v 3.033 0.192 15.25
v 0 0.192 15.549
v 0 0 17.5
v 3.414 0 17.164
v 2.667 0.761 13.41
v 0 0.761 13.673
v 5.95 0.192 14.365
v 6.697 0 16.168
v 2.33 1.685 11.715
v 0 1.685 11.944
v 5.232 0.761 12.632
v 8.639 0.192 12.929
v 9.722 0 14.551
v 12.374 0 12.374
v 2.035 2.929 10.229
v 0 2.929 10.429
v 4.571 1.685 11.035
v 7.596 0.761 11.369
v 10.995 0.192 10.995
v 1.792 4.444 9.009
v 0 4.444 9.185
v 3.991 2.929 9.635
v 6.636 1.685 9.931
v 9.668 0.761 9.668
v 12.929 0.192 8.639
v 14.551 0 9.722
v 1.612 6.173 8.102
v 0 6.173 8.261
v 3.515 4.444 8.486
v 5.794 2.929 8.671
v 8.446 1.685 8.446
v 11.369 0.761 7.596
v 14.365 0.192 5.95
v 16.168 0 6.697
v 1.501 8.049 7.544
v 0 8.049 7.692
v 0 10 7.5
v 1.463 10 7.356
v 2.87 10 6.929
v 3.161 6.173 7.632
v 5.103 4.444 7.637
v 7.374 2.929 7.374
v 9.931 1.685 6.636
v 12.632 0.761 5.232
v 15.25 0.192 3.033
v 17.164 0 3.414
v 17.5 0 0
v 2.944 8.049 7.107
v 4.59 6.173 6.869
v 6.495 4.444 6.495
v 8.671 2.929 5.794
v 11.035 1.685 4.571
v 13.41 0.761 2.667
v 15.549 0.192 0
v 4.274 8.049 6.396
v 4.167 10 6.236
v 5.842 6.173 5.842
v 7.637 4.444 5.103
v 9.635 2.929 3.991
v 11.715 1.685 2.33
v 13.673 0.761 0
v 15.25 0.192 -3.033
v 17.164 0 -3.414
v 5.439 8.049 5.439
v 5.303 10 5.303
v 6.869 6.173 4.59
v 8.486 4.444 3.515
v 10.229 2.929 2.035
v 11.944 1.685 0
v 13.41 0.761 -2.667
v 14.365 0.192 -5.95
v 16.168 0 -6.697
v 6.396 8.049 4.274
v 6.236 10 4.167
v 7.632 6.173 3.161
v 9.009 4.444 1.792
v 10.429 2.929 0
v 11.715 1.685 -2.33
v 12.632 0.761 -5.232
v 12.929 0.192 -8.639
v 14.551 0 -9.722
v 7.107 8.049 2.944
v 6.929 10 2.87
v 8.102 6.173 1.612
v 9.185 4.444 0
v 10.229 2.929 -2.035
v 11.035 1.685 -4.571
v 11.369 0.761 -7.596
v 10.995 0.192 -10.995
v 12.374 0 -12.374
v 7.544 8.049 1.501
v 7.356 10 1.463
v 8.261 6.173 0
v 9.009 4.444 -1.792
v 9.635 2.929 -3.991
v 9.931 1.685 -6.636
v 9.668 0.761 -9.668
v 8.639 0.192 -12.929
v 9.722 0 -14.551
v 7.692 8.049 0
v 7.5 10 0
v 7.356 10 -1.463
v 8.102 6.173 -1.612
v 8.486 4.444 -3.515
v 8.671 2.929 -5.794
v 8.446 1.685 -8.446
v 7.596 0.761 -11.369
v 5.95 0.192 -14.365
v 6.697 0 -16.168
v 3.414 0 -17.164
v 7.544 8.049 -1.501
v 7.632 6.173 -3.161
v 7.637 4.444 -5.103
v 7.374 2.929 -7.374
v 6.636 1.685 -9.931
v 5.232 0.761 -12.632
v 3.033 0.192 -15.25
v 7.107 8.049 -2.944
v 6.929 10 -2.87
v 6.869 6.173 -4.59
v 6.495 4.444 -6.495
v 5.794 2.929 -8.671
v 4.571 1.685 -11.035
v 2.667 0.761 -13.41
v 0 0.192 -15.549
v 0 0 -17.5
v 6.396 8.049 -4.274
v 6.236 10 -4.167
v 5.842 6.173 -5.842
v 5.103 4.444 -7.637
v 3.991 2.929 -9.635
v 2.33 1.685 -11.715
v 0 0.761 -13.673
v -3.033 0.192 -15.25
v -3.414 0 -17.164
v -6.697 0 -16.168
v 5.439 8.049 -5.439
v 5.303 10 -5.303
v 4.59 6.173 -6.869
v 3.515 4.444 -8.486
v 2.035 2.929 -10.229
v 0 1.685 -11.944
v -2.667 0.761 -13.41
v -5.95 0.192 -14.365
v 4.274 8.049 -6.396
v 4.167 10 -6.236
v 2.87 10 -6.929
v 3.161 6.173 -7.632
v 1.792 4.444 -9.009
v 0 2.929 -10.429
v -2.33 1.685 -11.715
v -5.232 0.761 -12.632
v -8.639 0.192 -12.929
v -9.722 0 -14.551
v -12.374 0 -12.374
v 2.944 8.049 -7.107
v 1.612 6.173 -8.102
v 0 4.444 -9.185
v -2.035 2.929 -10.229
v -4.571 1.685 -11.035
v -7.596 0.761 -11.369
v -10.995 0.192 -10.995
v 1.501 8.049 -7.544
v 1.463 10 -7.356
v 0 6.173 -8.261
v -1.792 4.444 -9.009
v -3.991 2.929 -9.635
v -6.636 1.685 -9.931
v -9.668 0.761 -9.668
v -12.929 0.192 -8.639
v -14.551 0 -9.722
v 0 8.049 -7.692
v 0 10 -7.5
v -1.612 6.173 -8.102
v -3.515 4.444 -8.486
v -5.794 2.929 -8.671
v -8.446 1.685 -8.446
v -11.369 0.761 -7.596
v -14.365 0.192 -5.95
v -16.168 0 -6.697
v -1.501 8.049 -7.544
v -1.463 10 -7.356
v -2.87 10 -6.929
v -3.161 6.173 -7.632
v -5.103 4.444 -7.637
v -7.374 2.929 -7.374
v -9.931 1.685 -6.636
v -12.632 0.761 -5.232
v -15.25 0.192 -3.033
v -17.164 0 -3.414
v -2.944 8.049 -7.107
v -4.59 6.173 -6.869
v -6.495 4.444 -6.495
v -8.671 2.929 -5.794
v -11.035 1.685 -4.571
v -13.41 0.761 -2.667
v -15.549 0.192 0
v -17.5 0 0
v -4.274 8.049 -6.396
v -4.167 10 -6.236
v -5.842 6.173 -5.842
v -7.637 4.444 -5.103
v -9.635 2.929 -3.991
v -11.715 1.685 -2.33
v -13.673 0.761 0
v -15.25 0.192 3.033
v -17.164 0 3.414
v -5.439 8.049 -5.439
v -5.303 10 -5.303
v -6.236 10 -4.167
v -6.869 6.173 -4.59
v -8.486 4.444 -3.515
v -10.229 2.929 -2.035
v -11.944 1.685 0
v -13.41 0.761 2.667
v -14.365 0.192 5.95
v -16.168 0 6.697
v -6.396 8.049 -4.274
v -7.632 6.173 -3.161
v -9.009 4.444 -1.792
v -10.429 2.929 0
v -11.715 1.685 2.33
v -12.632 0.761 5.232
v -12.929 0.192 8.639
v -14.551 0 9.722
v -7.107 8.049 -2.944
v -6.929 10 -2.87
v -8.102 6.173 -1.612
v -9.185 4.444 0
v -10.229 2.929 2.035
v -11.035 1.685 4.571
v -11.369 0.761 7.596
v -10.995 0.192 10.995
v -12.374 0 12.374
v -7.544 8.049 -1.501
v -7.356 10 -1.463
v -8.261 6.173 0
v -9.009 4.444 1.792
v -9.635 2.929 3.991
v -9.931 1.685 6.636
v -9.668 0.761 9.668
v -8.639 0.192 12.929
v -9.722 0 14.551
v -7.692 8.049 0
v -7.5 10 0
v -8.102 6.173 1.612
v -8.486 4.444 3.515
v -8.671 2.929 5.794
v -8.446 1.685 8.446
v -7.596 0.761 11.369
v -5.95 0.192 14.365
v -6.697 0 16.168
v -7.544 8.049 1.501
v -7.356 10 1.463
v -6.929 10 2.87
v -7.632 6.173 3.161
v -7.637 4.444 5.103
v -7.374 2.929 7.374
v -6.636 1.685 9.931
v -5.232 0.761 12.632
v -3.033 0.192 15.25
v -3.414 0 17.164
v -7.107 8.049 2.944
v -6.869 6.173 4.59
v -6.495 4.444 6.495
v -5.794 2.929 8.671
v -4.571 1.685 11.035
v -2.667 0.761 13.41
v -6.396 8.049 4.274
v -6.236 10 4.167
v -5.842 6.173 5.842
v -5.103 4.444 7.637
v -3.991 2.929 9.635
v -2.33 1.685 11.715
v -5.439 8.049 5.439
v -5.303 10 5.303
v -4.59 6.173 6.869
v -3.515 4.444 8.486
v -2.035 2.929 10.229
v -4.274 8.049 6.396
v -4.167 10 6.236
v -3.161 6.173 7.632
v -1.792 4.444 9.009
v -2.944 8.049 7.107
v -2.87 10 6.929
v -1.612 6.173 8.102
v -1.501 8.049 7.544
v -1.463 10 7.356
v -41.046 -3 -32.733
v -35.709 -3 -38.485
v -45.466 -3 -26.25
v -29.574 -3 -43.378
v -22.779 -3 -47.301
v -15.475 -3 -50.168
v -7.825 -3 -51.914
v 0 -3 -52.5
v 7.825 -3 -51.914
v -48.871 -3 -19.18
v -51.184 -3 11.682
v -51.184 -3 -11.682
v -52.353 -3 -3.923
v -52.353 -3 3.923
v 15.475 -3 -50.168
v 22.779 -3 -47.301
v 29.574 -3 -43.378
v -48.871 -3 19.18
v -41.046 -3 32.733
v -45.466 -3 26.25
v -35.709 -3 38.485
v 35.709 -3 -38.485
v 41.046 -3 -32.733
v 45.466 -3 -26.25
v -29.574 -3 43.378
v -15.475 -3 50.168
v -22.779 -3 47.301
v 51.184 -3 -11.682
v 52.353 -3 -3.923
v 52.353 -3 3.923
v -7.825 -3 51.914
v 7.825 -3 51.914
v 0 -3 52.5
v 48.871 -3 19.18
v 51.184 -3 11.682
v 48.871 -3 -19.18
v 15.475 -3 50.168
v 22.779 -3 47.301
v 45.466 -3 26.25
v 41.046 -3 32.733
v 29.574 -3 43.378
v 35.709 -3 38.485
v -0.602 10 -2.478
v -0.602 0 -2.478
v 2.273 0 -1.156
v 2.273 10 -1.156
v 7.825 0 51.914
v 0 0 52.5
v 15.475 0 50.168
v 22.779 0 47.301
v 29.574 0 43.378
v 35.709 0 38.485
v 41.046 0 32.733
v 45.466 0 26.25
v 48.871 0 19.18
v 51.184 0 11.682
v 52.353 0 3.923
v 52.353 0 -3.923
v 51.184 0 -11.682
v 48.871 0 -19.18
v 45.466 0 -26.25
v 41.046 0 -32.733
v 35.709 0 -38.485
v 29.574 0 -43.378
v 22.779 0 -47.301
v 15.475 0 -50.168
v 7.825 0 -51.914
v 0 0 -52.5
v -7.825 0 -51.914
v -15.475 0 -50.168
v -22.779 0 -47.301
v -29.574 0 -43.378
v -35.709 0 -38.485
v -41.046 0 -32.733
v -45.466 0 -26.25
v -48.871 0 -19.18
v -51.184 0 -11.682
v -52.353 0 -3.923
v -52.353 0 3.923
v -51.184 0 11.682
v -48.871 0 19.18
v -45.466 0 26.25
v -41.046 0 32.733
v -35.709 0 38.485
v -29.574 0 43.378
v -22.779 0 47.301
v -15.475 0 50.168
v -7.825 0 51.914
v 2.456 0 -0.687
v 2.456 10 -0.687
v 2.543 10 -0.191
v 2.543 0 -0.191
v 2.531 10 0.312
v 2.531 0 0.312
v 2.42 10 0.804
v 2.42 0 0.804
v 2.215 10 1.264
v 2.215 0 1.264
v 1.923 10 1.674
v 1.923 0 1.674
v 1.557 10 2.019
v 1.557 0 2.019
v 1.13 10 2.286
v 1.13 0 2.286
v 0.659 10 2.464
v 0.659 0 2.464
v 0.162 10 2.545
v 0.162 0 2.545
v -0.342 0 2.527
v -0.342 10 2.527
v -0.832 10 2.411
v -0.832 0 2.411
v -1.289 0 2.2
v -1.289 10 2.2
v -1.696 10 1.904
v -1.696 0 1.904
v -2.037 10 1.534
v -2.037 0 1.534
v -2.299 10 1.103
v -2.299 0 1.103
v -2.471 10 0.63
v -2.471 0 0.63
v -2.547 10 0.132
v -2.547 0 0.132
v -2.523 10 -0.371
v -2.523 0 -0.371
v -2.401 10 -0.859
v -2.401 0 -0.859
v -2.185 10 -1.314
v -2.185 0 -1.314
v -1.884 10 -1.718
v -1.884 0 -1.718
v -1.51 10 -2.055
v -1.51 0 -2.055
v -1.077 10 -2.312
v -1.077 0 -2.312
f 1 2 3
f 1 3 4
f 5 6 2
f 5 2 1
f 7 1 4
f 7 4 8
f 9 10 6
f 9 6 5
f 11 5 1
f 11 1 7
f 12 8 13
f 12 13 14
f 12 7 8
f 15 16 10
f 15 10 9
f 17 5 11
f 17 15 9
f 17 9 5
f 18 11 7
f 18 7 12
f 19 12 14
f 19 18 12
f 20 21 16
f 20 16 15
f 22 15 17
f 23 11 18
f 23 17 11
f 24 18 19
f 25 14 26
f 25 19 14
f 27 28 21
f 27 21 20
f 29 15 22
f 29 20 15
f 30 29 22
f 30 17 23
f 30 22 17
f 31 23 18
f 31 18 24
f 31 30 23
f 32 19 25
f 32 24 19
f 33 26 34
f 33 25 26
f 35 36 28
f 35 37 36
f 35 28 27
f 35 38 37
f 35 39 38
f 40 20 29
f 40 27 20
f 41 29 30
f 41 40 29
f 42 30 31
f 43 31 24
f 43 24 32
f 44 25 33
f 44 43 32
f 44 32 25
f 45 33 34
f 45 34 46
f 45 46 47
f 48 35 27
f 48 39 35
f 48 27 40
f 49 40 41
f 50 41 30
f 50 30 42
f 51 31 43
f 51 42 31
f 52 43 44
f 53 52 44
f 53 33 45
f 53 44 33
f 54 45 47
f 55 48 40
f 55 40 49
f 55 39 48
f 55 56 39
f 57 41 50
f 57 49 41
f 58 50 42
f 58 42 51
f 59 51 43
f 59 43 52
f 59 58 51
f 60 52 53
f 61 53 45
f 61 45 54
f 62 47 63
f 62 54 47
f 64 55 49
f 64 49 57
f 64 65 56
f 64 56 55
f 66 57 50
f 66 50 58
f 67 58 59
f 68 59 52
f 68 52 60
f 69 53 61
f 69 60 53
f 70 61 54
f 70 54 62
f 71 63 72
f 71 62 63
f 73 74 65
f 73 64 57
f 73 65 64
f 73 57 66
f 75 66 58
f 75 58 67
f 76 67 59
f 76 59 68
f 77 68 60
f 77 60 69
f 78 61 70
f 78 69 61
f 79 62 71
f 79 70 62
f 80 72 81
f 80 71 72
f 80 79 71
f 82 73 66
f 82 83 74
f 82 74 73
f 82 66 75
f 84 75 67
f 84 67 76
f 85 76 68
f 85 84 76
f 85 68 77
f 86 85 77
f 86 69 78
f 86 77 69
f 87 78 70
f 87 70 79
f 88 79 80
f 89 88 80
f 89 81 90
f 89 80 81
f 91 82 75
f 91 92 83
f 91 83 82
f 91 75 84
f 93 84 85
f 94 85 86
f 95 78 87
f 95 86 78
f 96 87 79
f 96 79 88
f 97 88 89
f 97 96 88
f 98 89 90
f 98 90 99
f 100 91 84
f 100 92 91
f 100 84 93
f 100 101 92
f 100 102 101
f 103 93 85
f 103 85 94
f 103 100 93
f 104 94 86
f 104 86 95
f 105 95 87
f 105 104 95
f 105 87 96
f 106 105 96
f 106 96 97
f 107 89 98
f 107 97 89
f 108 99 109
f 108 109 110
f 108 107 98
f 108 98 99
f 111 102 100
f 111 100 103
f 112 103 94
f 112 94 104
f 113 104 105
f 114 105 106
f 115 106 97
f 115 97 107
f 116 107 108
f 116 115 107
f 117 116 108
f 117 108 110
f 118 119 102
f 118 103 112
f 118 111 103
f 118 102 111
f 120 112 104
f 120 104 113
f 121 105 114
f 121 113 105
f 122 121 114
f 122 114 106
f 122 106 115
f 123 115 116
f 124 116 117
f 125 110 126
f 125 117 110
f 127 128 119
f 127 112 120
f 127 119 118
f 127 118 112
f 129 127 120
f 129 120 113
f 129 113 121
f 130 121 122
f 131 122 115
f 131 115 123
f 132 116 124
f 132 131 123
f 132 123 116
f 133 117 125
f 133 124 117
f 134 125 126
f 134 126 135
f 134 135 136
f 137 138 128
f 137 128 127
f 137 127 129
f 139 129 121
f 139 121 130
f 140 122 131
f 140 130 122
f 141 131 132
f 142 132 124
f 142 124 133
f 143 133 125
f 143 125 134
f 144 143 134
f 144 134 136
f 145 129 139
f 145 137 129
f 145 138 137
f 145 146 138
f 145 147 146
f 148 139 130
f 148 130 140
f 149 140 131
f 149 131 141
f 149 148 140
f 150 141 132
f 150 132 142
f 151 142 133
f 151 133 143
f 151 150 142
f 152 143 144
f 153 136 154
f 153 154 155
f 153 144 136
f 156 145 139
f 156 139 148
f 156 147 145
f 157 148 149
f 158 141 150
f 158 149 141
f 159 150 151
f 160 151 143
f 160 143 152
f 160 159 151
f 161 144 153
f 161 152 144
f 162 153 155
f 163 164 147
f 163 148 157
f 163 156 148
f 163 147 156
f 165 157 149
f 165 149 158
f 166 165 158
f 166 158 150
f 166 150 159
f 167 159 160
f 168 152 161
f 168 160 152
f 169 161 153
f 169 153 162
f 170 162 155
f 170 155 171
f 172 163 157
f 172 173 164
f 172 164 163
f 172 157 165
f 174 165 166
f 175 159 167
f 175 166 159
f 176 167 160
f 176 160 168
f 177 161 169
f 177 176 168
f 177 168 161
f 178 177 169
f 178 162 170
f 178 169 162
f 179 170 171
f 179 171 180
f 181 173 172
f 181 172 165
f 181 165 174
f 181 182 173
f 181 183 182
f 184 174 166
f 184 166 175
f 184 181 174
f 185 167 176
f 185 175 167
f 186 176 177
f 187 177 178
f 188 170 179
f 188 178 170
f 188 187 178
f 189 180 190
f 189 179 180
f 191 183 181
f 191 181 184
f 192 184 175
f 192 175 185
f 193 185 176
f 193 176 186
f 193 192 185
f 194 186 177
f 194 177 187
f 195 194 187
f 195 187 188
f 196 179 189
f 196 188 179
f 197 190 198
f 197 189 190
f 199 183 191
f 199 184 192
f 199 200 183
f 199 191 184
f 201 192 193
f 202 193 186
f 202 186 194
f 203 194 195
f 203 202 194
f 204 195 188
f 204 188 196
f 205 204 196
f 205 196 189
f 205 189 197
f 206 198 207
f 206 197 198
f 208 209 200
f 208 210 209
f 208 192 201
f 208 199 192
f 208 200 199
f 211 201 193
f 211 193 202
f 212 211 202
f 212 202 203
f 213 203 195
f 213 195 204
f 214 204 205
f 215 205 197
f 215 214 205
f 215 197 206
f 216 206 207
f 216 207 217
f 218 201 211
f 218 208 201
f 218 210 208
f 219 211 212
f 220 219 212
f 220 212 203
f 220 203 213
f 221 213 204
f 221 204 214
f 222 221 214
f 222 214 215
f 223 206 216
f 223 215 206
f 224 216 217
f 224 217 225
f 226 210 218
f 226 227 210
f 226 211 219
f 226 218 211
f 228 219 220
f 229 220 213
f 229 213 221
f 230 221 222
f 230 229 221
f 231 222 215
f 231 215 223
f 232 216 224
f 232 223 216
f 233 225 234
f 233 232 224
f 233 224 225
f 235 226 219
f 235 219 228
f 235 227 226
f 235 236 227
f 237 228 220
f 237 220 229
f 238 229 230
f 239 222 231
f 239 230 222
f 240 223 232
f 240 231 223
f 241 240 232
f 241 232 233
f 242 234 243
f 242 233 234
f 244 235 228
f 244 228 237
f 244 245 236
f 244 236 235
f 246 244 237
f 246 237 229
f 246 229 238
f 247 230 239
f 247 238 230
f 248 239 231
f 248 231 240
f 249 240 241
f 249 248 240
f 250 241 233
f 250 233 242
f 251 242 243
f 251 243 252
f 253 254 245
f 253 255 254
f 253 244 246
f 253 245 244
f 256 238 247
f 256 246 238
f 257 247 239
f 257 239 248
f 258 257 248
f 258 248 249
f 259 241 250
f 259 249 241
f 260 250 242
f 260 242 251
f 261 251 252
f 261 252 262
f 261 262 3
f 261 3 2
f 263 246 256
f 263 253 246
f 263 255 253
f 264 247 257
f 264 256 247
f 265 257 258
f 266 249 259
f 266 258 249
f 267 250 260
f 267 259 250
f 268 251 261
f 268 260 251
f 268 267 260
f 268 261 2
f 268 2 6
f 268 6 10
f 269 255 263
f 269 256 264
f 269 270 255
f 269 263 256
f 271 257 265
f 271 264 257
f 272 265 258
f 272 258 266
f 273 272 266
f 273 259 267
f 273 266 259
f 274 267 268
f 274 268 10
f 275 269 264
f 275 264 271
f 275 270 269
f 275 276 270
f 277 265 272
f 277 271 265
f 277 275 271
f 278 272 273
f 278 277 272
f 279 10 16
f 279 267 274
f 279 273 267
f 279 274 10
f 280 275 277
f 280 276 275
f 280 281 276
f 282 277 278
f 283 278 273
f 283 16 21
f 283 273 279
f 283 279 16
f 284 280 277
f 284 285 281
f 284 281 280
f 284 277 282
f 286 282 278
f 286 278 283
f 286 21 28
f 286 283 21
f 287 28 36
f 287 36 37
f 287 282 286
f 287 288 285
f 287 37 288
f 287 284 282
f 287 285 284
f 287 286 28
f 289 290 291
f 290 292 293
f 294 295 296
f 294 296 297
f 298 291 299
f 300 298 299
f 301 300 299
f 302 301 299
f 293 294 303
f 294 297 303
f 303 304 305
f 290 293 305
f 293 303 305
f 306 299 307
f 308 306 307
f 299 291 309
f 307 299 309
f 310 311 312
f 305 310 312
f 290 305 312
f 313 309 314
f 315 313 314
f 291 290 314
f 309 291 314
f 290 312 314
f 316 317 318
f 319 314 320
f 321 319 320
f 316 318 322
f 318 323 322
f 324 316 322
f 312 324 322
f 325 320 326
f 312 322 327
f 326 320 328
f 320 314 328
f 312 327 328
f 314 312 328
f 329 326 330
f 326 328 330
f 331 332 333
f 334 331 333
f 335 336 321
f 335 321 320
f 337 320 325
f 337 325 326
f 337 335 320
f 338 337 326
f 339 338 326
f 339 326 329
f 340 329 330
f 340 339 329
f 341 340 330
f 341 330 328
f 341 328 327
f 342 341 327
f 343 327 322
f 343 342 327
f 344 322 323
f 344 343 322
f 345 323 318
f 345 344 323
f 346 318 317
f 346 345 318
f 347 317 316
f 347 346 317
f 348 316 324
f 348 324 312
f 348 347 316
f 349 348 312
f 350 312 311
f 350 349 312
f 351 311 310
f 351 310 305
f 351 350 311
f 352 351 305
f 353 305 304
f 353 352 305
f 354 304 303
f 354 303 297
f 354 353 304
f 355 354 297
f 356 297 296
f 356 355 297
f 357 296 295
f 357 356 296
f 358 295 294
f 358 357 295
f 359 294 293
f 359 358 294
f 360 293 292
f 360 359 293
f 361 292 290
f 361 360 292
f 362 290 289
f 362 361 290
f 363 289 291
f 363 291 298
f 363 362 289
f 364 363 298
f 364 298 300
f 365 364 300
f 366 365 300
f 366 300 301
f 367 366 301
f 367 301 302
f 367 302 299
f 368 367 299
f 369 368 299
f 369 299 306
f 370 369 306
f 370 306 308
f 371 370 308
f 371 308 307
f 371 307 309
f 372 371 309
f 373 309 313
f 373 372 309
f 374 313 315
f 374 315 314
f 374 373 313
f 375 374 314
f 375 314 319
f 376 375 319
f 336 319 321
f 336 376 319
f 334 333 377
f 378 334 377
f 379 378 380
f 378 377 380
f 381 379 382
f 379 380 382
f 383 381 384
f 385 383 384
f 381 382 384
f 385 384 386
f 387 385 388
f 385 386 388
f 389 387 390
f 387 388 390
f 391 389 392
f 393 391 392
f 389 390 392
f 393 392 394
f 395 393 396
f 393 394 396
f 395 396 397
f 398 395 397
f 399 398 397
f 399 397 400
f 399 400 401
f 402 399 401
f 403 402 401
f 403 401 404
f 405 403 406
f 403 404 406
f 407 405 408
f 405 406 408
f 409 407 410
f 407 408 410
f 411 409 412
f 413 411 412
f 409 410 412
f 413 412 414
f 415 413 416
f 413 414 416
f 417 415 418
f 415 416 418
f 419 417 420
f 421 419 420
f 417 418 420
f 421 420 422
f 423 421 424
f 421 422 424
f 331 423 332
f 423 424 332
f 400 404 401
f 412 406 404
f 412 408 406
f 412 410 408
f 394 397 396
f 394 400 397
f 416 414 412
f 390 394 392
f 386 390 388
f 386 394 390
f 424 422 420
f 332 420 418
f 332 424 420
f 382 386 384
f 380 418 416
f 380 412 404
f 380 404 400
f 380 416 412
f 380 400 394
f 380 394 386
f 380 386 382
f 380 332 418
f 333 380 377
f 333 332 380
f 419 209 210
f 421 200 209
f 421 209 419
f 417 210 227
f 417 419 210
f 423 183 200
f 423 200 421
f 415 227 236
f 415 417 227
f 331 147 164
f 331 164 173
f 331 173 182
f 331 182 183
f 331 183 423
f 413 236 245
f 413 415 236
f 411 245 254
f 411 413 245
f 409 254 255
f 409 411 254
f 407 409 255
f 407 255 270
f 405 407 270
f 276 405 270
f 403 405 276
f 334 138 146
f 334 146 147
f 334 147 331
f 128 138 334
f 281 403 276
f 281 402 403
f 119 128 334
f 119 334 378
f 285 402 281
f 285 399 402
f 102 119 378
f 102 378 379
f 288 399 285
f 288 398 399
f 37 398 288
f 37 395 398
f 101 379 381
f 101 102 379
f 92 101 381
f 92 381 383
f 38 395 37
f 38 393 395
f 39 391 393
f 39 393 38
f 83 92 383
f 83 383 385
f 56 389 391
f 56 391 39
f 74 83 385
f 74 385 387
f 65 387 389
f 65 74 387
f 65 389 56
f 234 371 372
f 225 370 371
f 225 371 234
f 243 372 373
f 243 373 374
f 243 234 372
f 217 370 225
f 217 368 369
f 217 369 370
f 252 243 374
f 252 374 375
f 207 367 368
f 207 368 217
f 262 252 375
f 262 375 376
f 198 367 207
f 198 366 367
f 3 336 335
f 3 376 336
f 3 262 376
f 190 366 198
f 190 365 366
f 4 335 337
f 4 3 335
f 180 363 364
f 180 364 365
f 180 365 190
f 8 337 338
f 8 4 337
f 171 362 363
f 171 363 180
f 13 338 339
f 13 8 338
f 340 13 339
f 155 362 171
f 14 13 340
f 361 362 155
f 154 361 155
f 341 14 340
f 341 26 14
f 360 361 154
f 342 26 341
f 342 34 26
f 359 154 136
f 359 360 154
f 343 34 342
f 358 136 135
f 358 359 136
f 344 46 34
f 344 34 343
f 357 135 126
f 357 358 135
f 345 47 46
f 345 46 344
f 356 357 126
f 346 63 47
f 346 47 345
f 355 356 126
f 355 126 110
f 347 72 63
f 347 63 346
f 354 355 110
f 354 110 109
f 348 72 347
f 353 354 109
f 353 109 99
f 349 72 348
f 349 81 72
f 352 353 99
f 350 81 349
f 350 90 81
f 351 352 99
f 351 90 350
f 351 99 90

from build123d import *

# Parameters (mm, degrees)
SKIZZE1_R                       = 52.5
SKIZZE1_R_2                     = 7.5
SKIZZE1_R_3                     = 2.55
AUFSATZ_LINEAR_AUSTRAGEN1_DEPTH = 3
SKIZZE1_3_R                     = 7.5
AUFSATZ_LINEAR_AUSTRAGEN2_DEPTH = 10
VERRUNDUNG1_R                   = 10


with BuildPart() as part:
    # Skizze1 → Aufsatz-Linear austragen1 (new body)
    # profile 1 of 6: a face of its own
    with BuildSketch(Plane(origin=(0, 0, 0), x_dir=(1, 0, 0), z_dir=(0, 1, 0))):
        with Locations(Location((0, 0, 0), (0, 0, 270))):
            Circle(SKIZZE1_R)
        Circle(SKIZZE1_R_2, mode=Mode.SUBTRACT)
    # profile 2 of 6: a face of its own
    with BuildSketch(Plane(origin=(0, 0, 0), x_dir=(1, 0, 0), z_dir=(0, 1, 0))):
        Circle(SKIZZE1_R_2)
        Circle(SKIZZE1_R_3, mode=Mode.SUBTRACT)
    # profile 3 of 6: a face of its own
    with BuildSketch(Plane(origin=(0, 0, 0), x_dir=(1, 0, 0), z_dir=(0, 1, 0))):
        with BuildLine():
            Line((2.272895339, 1.156047913), (-0.601535262, 2.47803457))
            ThreePointArc((-0.601535262, 2.47803457), (-1.576163869, -2.004546697), (2.55, 0))
            ThreePointArc((2.55, 0), (2.47975635, 0.594397546), (2.272895339, 1.156047913))
        make_face()
    # profile 4 of 6: a face of its own
    with BuildSketch(Plane(origin=(0, 0, 0), x_dir=(1, 0, 0), z_dir=(0, 1, 0))):
        with BuildLine():
            ThreePointArc((2.272895339, 1.156047913), (1.065492049, 2.316727583), (-0.601535262, 2.47803457))
            Line((-0.601535262, 2.47803457), (2.272895339, 1.156047913))
        make_face()
    # profile 5 of 6: a face of its own
    with BuildSketch(Plane(origin=(0, 0, 0), x_dir=(1, 0, 0), z_dir=(0, 1, 0))):
        with BuildLine():
            Line((2.272895339, 1.156047913), (-0.601535262, 2.47803457))
            ThreePointArc((-0.601535262, 2.47803457), (-1.576163869, -2.004546697), (2.55, 0))
            ThreePointArc((2.55, 0), (2.47975635, 0.594397546), (2.272895339, 1.156047913))
        make_face()
    # profile 6 of 6: a face of its own
    with BuildSketch(Plane(origin=(0, 0, 0), x_dir=(1, 0, 0), z_dir=(0, 1, 0))):
        with BuildLine():
            ThreePointArc((2.272895339, 1.156047913), (1.065492049, 2.316727583), (-0.601535262, 2.47803457))
            Line((-0.601535262, 2.47803457), (2.272895339, 1.156047913))
        make_face()
    extrude(amount=-AUFSATZ_LINEAR_AUSTRAGEN1_DEPTH)

    # Skizze1<3> → Aufsatz-Linear austragen2 (add)
    with BuildSketch(Plane(origin=(0, 0, 0), x_dir=(1, 0, 0), z_dir=(0, 1, 0))):
        with Locations(Location((0, 0, 0), (0, 0, 270))):
            Circle(SKIZZE1_3_R)
        with BuildLine():
            Line((-0.601535262, 2.47803457), (2.272895339, 1.156047913))
            ThreePointArc((2.272895339, 1.156047913), (-1.065492049, -2.316727583), (-0.601535262, 2.47803457))
        make_face(mode=Mode.SUBTRACT)
    extrude(amount=AUFSATZ_LINEAR_AUSTRAGEN2_DEPTH)

    # Verrundung1
    verrundung1_edges = [part.edges().sort_by_distance(p)[0] for p in [
        (0, 0, -7.5),
    ]]
    fillet(verrundung1_edges, radius=VERRUNDUNG1_R - 0.0001)  # a hair under: the kernel refuses the full size


solid = part.part
